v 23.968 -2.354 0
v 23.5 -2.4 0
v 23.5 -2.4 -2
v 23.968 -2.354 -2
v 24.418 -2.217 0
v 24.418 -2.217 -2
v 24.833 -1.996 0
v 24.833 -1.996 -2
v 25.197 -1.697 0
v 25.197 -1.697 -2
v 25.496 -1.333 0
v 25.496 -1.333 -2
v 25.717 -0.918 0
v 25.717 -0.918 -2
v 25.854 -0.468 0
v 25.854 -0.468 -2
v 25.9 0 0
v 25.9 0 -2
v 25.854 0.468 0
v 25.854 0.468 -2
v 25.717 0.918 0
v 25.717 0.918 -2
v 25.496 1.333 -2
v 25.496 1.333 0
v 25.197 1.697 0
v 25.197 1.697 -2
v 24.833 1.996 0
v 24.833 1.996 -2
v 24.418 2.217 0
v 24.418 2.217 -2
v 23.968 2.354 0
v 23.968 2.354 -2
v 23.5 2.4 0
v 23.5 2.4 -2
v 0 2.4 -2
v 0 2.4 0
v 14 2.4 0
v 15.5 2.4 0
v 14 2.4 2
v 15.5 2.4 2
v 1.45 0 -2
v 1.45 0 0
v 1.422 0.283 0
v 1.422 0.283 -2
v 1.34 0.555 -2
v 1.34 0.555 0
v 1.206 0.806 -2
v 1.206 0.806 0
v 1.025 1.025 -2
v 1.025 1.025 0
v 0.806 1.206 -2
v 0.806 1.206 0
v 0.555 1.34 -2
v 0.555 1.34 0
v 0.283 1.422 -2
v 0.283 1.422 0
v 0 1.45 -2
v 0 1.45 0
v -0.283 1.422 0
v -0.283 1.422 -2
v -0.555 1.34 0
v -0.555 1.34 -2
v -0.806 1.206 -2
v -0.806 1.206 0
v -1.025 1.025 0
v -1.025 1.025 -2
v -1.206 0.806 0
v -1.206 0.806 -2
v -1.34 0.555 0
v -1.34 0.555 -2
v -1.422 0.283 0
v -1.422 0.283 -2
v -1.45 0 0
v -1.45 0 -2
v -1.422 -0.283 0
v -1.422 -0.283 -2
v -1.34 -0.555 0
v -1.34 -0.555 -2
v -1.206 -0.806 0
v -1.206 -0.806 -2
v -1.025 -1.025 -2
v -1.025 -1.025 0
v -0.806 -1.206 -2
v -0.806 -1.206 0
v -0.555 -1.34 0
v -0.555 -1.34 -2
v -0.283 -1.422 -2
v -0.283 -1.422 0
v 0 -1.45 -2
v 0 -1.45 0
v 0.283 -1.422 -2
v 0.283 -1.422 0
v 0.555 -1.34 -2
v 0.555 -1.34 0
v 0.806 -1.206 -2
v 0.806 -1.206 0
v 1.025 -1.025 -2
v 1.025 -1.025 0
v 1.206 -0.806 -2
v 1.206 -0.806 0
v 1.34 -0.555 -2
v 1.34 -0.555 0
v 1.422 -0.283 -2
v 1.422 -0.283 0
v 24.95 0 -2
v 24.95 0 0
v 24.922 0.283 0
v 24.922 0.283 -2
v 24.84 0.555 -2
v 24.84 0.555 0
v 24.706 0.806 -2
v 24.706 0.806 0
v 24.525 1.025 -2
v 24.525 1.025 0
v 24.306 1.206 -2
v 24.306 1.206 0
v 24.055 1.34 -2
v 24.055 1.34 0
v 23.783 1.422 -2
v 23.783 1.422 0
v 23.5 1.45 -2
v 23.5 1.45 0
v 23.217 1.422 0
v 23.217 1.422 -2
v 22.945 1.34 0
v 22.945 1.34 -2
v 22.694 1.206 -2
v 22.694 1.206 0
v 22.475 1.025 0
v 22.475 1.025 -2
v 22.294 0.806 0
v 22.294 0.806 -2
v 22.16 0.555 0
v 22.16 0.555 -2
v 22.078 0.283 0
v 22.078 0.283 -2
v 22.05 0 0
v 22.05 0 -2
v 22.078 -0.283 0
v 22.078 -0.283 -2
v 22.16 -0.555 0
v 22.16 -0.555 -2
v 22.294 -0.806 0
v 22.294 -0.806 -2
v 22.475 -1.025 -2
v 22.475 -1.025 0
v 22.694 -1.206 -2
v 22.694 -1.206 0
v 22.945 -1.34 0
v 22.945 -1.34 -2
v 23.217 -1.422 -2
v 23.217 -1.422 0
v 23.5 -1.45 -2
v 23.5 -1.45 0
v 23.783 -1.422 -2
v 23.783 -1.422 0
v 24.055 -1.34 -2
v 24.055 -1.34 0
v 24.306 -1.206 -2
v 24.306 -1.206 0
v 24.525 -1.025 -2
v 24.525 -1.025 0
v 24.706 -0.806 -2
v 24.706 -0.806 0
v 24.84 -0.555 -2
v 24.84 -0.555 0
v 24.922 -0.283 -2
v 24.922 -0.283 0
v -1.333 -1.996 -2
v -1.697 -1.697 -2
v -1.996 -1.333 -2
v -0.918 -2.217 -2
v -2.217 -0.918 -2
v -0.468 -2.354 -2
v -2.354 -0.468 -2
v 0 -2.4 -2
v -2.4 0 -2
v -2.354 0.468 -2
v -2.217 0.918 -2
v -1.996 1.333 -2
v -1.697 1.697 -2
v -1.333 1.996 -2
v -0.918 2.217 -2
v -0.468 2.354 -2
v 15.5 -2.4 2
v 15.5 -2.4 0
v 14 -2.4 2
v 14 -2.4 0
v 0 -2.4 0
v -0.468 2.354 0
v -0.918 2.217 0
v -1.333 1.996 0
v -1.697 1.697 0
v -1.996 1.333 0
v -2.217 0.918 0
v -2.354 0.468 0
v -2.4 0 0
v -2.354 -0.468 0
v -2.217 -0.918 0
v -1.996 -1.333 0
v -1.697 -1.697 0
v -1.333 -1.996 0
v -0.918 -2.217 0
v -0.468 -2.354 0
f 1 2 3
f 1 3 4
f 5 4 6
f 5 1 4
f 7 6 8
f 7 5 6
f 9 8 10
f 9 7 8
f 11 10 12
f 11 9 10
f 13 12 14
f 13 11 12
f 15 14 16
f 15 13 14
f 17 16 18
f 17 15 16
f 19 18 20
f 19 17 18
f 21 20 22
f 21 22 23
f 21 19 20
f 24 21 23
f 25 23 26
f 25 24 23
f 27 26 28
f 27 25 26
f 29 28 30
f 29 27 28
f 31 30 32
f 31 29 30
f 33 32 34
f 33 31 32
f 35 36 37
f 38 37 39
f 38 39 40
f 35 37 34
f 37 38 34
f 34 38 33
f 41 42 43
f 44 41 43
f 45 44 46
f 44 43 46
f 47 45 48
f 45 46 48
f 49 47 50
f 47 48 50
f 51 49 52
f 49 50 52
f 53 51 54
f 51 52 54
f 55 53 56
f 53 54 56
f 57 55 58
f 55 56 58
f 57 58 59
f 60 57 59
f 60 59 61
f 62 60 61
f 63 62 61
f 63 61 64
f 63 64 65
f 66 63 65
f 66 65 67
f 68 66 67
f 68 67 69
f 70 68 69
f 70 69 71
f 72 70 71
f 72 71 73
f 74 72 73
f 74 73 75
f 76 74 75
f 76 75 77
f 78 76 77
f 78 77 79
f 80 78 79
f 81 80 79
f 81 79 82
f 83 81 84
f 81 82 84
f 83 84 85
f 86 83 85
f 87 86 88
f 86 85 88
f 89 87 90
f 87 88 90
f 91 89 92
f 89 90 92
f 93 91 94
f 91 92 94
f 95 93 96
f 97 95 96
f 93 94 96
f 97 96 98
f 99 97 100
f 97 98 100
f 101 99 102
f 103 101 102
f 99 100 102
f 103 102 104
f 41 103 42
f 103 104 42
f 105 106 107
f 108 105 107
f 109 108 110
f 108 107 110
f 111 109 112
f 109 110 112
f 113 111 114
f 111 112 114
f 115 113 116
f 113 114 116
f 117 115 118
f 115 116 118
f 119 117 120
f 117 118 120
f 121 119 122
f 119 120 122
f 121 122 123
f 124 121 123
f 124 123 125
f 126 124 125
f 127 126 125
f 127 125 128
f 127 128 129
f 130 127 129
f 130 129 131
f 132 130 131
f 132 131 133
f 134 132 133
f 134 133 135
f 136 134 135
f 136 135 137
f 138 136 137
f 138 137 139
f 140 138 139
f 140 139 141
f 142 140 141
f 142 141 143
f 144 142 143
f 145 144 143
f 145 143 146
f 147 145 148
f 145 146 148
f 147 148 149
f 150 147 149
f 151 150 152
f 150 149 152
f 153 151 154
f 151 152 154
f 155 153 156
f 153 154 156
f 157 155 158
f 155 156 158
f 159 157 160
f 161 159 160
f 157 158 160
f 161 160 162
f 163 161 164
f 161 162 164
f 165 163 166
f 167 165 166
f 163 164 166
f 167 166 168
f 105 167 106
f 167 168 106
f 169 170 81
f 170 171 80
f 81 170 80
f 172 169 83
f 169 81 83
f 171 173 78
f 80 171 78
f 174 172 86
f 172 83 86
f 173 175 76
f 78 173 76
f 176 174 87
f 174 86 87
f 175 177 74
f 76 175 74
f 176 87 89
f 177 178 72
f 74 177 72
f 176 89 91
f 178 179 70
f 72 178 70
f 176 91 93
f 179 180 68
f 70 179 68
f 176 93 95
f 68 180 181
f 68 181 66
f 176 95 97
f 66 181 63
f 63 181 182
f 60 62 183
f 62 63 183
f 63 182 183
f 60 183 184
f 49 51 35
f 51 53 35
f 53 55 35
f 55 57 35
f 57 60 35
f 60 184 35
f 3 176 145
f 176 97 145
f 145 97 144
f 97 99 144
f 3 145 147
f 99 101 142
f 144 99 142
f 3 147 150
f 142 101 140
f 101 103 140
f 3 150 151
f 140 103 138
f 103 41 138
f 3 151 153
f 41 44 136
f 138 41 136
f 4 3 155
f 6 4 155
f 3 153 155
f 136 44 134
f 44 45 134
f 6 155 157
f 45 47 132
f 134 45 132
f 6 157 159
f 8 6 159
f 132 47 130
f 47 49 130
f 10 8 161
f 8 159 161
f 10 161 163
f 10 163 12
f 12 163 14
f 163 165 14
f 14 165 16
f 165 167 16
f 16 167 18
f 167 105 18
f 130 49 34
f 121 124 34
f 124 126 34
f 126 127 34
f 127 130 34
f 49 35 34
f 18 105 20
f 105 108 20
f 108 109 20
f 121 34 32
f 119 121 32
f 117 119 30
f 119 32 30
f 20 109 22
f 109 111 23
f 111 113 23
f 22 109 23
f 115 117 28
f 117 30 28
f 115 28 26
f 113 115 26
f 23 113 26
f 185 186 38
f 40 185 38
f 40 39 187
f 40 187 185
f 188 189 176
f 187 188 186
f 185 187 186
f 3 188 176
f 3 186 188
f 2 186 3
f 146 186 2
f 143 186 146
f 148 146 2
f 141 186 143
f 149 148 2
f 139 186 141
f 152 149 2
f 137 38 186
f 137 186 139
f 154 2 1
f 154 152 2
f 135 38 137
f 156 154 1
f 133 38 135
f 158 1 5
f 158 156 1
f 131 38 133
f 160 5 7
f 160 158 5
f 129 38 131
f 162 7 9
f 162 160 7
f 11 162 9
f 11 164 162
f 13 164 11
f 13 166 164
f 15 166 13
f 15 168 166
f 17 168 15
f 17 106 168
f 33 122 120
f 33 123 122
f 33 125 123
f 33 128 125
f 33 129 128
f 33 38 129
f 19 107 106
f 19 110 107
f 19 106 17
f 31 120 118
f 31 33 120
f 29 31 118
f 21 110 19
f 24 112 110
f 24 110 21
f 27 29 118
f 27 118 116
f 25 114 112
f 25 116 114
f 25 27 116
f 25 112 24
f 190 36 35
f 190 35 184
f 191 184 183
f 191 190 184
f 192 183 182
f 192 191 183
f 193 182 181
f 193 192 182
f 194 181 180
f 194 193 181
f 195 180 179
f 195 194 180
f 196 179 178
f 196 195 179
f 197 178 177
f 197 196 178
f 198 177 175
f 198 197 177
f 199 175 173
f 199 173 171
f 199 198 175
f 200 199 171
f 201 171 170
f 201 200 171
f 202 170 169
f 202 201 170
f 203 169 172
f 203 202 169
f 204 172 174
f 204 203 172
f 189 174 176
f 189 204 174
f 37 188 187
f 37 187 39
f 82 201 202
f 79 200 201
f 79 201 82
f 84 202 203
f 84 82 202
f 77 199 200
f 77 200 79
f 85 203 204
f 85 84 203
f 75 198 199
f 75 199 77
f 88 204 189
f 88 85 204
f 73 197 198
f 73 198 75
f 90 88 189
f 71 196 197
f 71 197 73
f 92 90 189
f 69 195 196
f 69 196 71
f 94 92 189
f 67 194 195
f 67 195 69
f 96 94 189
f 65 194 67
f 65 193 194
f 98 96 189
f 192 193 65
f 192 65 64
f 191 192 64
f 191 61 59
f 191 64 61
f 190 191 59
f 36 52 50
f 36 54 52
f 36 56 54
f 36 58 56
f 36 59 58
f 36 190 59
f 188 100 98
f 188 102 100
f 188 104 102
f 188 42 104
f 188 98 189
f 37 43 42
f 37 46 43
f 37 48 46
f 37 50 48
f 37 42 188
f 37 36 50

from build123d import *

# Parameters (mm, degrees)
PAD_DEPTH    = 2
SKETCH001_R  = 1.45
POCKET_DEPTH = 2.001
SKETCH002_W  = 1.5
SKETCH002_H  = 4.8
PAD001_DEPTH = 2


with BuildPart() as part:
    # Sketch → Pad (new body)
    with BuildSketch(Plane.XY):
        with BuildLine():
            ThreePointArc((0, 2.4), (-2.4, 0), (0, -2.4))
            Line((0, -2.4), (23.5, -2.4))
            ThreePointArc((23.5, -2.4), (25.9, 0), (23.5, 2.4))
            Line((0, 2.4), (23.5, 2.4))
        make_face()
    extrude(amount=-PAD_DEPTH)

    # Sketch001 → Pocket (cut, through all)
    with BuildSketch(Plane.XY):
        Circle(SKETCH001_R)
        with Locations((23.5, 0)):
            Circle(SKETCH001_R)
    extrude(amount=-POCKET_DEPTH, mode=Mode.SUBTRACT)

    # Sketch002 → Pad001 (join)
    with BuildSketch(Plane.XY):
        with Locations((14.75, 0)):
            Rectangle(SKETCH002_W, SKETCH002_H)
    extrude(amount=PAD001_DEPTH)


solid = part.part
